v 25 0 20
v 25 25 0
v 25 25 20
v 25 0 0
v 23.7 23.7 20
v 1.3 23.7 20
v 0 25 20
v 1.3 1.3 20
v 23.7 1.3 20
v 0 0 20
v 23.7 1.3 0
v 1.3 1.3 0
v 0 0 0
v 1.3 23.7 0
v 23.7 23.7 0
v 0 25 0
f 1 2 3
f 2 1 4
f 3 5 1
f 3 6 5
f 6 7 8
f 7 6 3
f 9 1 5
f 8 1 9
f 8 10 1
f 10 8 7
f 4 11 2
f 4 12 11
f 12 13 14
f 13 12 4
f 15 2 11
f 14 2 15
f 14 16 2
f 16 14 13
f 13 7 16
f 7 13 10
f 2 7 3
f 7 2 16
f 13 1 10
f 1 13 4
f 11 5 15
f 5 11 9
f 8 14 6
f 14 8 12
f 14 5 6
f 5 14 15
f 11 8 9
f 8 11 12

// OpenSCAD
difference(){
	cube([25,25,20]);
	translate([1.3,1.3,0]) cube([25-2.6,25-2.6,20]);
}
